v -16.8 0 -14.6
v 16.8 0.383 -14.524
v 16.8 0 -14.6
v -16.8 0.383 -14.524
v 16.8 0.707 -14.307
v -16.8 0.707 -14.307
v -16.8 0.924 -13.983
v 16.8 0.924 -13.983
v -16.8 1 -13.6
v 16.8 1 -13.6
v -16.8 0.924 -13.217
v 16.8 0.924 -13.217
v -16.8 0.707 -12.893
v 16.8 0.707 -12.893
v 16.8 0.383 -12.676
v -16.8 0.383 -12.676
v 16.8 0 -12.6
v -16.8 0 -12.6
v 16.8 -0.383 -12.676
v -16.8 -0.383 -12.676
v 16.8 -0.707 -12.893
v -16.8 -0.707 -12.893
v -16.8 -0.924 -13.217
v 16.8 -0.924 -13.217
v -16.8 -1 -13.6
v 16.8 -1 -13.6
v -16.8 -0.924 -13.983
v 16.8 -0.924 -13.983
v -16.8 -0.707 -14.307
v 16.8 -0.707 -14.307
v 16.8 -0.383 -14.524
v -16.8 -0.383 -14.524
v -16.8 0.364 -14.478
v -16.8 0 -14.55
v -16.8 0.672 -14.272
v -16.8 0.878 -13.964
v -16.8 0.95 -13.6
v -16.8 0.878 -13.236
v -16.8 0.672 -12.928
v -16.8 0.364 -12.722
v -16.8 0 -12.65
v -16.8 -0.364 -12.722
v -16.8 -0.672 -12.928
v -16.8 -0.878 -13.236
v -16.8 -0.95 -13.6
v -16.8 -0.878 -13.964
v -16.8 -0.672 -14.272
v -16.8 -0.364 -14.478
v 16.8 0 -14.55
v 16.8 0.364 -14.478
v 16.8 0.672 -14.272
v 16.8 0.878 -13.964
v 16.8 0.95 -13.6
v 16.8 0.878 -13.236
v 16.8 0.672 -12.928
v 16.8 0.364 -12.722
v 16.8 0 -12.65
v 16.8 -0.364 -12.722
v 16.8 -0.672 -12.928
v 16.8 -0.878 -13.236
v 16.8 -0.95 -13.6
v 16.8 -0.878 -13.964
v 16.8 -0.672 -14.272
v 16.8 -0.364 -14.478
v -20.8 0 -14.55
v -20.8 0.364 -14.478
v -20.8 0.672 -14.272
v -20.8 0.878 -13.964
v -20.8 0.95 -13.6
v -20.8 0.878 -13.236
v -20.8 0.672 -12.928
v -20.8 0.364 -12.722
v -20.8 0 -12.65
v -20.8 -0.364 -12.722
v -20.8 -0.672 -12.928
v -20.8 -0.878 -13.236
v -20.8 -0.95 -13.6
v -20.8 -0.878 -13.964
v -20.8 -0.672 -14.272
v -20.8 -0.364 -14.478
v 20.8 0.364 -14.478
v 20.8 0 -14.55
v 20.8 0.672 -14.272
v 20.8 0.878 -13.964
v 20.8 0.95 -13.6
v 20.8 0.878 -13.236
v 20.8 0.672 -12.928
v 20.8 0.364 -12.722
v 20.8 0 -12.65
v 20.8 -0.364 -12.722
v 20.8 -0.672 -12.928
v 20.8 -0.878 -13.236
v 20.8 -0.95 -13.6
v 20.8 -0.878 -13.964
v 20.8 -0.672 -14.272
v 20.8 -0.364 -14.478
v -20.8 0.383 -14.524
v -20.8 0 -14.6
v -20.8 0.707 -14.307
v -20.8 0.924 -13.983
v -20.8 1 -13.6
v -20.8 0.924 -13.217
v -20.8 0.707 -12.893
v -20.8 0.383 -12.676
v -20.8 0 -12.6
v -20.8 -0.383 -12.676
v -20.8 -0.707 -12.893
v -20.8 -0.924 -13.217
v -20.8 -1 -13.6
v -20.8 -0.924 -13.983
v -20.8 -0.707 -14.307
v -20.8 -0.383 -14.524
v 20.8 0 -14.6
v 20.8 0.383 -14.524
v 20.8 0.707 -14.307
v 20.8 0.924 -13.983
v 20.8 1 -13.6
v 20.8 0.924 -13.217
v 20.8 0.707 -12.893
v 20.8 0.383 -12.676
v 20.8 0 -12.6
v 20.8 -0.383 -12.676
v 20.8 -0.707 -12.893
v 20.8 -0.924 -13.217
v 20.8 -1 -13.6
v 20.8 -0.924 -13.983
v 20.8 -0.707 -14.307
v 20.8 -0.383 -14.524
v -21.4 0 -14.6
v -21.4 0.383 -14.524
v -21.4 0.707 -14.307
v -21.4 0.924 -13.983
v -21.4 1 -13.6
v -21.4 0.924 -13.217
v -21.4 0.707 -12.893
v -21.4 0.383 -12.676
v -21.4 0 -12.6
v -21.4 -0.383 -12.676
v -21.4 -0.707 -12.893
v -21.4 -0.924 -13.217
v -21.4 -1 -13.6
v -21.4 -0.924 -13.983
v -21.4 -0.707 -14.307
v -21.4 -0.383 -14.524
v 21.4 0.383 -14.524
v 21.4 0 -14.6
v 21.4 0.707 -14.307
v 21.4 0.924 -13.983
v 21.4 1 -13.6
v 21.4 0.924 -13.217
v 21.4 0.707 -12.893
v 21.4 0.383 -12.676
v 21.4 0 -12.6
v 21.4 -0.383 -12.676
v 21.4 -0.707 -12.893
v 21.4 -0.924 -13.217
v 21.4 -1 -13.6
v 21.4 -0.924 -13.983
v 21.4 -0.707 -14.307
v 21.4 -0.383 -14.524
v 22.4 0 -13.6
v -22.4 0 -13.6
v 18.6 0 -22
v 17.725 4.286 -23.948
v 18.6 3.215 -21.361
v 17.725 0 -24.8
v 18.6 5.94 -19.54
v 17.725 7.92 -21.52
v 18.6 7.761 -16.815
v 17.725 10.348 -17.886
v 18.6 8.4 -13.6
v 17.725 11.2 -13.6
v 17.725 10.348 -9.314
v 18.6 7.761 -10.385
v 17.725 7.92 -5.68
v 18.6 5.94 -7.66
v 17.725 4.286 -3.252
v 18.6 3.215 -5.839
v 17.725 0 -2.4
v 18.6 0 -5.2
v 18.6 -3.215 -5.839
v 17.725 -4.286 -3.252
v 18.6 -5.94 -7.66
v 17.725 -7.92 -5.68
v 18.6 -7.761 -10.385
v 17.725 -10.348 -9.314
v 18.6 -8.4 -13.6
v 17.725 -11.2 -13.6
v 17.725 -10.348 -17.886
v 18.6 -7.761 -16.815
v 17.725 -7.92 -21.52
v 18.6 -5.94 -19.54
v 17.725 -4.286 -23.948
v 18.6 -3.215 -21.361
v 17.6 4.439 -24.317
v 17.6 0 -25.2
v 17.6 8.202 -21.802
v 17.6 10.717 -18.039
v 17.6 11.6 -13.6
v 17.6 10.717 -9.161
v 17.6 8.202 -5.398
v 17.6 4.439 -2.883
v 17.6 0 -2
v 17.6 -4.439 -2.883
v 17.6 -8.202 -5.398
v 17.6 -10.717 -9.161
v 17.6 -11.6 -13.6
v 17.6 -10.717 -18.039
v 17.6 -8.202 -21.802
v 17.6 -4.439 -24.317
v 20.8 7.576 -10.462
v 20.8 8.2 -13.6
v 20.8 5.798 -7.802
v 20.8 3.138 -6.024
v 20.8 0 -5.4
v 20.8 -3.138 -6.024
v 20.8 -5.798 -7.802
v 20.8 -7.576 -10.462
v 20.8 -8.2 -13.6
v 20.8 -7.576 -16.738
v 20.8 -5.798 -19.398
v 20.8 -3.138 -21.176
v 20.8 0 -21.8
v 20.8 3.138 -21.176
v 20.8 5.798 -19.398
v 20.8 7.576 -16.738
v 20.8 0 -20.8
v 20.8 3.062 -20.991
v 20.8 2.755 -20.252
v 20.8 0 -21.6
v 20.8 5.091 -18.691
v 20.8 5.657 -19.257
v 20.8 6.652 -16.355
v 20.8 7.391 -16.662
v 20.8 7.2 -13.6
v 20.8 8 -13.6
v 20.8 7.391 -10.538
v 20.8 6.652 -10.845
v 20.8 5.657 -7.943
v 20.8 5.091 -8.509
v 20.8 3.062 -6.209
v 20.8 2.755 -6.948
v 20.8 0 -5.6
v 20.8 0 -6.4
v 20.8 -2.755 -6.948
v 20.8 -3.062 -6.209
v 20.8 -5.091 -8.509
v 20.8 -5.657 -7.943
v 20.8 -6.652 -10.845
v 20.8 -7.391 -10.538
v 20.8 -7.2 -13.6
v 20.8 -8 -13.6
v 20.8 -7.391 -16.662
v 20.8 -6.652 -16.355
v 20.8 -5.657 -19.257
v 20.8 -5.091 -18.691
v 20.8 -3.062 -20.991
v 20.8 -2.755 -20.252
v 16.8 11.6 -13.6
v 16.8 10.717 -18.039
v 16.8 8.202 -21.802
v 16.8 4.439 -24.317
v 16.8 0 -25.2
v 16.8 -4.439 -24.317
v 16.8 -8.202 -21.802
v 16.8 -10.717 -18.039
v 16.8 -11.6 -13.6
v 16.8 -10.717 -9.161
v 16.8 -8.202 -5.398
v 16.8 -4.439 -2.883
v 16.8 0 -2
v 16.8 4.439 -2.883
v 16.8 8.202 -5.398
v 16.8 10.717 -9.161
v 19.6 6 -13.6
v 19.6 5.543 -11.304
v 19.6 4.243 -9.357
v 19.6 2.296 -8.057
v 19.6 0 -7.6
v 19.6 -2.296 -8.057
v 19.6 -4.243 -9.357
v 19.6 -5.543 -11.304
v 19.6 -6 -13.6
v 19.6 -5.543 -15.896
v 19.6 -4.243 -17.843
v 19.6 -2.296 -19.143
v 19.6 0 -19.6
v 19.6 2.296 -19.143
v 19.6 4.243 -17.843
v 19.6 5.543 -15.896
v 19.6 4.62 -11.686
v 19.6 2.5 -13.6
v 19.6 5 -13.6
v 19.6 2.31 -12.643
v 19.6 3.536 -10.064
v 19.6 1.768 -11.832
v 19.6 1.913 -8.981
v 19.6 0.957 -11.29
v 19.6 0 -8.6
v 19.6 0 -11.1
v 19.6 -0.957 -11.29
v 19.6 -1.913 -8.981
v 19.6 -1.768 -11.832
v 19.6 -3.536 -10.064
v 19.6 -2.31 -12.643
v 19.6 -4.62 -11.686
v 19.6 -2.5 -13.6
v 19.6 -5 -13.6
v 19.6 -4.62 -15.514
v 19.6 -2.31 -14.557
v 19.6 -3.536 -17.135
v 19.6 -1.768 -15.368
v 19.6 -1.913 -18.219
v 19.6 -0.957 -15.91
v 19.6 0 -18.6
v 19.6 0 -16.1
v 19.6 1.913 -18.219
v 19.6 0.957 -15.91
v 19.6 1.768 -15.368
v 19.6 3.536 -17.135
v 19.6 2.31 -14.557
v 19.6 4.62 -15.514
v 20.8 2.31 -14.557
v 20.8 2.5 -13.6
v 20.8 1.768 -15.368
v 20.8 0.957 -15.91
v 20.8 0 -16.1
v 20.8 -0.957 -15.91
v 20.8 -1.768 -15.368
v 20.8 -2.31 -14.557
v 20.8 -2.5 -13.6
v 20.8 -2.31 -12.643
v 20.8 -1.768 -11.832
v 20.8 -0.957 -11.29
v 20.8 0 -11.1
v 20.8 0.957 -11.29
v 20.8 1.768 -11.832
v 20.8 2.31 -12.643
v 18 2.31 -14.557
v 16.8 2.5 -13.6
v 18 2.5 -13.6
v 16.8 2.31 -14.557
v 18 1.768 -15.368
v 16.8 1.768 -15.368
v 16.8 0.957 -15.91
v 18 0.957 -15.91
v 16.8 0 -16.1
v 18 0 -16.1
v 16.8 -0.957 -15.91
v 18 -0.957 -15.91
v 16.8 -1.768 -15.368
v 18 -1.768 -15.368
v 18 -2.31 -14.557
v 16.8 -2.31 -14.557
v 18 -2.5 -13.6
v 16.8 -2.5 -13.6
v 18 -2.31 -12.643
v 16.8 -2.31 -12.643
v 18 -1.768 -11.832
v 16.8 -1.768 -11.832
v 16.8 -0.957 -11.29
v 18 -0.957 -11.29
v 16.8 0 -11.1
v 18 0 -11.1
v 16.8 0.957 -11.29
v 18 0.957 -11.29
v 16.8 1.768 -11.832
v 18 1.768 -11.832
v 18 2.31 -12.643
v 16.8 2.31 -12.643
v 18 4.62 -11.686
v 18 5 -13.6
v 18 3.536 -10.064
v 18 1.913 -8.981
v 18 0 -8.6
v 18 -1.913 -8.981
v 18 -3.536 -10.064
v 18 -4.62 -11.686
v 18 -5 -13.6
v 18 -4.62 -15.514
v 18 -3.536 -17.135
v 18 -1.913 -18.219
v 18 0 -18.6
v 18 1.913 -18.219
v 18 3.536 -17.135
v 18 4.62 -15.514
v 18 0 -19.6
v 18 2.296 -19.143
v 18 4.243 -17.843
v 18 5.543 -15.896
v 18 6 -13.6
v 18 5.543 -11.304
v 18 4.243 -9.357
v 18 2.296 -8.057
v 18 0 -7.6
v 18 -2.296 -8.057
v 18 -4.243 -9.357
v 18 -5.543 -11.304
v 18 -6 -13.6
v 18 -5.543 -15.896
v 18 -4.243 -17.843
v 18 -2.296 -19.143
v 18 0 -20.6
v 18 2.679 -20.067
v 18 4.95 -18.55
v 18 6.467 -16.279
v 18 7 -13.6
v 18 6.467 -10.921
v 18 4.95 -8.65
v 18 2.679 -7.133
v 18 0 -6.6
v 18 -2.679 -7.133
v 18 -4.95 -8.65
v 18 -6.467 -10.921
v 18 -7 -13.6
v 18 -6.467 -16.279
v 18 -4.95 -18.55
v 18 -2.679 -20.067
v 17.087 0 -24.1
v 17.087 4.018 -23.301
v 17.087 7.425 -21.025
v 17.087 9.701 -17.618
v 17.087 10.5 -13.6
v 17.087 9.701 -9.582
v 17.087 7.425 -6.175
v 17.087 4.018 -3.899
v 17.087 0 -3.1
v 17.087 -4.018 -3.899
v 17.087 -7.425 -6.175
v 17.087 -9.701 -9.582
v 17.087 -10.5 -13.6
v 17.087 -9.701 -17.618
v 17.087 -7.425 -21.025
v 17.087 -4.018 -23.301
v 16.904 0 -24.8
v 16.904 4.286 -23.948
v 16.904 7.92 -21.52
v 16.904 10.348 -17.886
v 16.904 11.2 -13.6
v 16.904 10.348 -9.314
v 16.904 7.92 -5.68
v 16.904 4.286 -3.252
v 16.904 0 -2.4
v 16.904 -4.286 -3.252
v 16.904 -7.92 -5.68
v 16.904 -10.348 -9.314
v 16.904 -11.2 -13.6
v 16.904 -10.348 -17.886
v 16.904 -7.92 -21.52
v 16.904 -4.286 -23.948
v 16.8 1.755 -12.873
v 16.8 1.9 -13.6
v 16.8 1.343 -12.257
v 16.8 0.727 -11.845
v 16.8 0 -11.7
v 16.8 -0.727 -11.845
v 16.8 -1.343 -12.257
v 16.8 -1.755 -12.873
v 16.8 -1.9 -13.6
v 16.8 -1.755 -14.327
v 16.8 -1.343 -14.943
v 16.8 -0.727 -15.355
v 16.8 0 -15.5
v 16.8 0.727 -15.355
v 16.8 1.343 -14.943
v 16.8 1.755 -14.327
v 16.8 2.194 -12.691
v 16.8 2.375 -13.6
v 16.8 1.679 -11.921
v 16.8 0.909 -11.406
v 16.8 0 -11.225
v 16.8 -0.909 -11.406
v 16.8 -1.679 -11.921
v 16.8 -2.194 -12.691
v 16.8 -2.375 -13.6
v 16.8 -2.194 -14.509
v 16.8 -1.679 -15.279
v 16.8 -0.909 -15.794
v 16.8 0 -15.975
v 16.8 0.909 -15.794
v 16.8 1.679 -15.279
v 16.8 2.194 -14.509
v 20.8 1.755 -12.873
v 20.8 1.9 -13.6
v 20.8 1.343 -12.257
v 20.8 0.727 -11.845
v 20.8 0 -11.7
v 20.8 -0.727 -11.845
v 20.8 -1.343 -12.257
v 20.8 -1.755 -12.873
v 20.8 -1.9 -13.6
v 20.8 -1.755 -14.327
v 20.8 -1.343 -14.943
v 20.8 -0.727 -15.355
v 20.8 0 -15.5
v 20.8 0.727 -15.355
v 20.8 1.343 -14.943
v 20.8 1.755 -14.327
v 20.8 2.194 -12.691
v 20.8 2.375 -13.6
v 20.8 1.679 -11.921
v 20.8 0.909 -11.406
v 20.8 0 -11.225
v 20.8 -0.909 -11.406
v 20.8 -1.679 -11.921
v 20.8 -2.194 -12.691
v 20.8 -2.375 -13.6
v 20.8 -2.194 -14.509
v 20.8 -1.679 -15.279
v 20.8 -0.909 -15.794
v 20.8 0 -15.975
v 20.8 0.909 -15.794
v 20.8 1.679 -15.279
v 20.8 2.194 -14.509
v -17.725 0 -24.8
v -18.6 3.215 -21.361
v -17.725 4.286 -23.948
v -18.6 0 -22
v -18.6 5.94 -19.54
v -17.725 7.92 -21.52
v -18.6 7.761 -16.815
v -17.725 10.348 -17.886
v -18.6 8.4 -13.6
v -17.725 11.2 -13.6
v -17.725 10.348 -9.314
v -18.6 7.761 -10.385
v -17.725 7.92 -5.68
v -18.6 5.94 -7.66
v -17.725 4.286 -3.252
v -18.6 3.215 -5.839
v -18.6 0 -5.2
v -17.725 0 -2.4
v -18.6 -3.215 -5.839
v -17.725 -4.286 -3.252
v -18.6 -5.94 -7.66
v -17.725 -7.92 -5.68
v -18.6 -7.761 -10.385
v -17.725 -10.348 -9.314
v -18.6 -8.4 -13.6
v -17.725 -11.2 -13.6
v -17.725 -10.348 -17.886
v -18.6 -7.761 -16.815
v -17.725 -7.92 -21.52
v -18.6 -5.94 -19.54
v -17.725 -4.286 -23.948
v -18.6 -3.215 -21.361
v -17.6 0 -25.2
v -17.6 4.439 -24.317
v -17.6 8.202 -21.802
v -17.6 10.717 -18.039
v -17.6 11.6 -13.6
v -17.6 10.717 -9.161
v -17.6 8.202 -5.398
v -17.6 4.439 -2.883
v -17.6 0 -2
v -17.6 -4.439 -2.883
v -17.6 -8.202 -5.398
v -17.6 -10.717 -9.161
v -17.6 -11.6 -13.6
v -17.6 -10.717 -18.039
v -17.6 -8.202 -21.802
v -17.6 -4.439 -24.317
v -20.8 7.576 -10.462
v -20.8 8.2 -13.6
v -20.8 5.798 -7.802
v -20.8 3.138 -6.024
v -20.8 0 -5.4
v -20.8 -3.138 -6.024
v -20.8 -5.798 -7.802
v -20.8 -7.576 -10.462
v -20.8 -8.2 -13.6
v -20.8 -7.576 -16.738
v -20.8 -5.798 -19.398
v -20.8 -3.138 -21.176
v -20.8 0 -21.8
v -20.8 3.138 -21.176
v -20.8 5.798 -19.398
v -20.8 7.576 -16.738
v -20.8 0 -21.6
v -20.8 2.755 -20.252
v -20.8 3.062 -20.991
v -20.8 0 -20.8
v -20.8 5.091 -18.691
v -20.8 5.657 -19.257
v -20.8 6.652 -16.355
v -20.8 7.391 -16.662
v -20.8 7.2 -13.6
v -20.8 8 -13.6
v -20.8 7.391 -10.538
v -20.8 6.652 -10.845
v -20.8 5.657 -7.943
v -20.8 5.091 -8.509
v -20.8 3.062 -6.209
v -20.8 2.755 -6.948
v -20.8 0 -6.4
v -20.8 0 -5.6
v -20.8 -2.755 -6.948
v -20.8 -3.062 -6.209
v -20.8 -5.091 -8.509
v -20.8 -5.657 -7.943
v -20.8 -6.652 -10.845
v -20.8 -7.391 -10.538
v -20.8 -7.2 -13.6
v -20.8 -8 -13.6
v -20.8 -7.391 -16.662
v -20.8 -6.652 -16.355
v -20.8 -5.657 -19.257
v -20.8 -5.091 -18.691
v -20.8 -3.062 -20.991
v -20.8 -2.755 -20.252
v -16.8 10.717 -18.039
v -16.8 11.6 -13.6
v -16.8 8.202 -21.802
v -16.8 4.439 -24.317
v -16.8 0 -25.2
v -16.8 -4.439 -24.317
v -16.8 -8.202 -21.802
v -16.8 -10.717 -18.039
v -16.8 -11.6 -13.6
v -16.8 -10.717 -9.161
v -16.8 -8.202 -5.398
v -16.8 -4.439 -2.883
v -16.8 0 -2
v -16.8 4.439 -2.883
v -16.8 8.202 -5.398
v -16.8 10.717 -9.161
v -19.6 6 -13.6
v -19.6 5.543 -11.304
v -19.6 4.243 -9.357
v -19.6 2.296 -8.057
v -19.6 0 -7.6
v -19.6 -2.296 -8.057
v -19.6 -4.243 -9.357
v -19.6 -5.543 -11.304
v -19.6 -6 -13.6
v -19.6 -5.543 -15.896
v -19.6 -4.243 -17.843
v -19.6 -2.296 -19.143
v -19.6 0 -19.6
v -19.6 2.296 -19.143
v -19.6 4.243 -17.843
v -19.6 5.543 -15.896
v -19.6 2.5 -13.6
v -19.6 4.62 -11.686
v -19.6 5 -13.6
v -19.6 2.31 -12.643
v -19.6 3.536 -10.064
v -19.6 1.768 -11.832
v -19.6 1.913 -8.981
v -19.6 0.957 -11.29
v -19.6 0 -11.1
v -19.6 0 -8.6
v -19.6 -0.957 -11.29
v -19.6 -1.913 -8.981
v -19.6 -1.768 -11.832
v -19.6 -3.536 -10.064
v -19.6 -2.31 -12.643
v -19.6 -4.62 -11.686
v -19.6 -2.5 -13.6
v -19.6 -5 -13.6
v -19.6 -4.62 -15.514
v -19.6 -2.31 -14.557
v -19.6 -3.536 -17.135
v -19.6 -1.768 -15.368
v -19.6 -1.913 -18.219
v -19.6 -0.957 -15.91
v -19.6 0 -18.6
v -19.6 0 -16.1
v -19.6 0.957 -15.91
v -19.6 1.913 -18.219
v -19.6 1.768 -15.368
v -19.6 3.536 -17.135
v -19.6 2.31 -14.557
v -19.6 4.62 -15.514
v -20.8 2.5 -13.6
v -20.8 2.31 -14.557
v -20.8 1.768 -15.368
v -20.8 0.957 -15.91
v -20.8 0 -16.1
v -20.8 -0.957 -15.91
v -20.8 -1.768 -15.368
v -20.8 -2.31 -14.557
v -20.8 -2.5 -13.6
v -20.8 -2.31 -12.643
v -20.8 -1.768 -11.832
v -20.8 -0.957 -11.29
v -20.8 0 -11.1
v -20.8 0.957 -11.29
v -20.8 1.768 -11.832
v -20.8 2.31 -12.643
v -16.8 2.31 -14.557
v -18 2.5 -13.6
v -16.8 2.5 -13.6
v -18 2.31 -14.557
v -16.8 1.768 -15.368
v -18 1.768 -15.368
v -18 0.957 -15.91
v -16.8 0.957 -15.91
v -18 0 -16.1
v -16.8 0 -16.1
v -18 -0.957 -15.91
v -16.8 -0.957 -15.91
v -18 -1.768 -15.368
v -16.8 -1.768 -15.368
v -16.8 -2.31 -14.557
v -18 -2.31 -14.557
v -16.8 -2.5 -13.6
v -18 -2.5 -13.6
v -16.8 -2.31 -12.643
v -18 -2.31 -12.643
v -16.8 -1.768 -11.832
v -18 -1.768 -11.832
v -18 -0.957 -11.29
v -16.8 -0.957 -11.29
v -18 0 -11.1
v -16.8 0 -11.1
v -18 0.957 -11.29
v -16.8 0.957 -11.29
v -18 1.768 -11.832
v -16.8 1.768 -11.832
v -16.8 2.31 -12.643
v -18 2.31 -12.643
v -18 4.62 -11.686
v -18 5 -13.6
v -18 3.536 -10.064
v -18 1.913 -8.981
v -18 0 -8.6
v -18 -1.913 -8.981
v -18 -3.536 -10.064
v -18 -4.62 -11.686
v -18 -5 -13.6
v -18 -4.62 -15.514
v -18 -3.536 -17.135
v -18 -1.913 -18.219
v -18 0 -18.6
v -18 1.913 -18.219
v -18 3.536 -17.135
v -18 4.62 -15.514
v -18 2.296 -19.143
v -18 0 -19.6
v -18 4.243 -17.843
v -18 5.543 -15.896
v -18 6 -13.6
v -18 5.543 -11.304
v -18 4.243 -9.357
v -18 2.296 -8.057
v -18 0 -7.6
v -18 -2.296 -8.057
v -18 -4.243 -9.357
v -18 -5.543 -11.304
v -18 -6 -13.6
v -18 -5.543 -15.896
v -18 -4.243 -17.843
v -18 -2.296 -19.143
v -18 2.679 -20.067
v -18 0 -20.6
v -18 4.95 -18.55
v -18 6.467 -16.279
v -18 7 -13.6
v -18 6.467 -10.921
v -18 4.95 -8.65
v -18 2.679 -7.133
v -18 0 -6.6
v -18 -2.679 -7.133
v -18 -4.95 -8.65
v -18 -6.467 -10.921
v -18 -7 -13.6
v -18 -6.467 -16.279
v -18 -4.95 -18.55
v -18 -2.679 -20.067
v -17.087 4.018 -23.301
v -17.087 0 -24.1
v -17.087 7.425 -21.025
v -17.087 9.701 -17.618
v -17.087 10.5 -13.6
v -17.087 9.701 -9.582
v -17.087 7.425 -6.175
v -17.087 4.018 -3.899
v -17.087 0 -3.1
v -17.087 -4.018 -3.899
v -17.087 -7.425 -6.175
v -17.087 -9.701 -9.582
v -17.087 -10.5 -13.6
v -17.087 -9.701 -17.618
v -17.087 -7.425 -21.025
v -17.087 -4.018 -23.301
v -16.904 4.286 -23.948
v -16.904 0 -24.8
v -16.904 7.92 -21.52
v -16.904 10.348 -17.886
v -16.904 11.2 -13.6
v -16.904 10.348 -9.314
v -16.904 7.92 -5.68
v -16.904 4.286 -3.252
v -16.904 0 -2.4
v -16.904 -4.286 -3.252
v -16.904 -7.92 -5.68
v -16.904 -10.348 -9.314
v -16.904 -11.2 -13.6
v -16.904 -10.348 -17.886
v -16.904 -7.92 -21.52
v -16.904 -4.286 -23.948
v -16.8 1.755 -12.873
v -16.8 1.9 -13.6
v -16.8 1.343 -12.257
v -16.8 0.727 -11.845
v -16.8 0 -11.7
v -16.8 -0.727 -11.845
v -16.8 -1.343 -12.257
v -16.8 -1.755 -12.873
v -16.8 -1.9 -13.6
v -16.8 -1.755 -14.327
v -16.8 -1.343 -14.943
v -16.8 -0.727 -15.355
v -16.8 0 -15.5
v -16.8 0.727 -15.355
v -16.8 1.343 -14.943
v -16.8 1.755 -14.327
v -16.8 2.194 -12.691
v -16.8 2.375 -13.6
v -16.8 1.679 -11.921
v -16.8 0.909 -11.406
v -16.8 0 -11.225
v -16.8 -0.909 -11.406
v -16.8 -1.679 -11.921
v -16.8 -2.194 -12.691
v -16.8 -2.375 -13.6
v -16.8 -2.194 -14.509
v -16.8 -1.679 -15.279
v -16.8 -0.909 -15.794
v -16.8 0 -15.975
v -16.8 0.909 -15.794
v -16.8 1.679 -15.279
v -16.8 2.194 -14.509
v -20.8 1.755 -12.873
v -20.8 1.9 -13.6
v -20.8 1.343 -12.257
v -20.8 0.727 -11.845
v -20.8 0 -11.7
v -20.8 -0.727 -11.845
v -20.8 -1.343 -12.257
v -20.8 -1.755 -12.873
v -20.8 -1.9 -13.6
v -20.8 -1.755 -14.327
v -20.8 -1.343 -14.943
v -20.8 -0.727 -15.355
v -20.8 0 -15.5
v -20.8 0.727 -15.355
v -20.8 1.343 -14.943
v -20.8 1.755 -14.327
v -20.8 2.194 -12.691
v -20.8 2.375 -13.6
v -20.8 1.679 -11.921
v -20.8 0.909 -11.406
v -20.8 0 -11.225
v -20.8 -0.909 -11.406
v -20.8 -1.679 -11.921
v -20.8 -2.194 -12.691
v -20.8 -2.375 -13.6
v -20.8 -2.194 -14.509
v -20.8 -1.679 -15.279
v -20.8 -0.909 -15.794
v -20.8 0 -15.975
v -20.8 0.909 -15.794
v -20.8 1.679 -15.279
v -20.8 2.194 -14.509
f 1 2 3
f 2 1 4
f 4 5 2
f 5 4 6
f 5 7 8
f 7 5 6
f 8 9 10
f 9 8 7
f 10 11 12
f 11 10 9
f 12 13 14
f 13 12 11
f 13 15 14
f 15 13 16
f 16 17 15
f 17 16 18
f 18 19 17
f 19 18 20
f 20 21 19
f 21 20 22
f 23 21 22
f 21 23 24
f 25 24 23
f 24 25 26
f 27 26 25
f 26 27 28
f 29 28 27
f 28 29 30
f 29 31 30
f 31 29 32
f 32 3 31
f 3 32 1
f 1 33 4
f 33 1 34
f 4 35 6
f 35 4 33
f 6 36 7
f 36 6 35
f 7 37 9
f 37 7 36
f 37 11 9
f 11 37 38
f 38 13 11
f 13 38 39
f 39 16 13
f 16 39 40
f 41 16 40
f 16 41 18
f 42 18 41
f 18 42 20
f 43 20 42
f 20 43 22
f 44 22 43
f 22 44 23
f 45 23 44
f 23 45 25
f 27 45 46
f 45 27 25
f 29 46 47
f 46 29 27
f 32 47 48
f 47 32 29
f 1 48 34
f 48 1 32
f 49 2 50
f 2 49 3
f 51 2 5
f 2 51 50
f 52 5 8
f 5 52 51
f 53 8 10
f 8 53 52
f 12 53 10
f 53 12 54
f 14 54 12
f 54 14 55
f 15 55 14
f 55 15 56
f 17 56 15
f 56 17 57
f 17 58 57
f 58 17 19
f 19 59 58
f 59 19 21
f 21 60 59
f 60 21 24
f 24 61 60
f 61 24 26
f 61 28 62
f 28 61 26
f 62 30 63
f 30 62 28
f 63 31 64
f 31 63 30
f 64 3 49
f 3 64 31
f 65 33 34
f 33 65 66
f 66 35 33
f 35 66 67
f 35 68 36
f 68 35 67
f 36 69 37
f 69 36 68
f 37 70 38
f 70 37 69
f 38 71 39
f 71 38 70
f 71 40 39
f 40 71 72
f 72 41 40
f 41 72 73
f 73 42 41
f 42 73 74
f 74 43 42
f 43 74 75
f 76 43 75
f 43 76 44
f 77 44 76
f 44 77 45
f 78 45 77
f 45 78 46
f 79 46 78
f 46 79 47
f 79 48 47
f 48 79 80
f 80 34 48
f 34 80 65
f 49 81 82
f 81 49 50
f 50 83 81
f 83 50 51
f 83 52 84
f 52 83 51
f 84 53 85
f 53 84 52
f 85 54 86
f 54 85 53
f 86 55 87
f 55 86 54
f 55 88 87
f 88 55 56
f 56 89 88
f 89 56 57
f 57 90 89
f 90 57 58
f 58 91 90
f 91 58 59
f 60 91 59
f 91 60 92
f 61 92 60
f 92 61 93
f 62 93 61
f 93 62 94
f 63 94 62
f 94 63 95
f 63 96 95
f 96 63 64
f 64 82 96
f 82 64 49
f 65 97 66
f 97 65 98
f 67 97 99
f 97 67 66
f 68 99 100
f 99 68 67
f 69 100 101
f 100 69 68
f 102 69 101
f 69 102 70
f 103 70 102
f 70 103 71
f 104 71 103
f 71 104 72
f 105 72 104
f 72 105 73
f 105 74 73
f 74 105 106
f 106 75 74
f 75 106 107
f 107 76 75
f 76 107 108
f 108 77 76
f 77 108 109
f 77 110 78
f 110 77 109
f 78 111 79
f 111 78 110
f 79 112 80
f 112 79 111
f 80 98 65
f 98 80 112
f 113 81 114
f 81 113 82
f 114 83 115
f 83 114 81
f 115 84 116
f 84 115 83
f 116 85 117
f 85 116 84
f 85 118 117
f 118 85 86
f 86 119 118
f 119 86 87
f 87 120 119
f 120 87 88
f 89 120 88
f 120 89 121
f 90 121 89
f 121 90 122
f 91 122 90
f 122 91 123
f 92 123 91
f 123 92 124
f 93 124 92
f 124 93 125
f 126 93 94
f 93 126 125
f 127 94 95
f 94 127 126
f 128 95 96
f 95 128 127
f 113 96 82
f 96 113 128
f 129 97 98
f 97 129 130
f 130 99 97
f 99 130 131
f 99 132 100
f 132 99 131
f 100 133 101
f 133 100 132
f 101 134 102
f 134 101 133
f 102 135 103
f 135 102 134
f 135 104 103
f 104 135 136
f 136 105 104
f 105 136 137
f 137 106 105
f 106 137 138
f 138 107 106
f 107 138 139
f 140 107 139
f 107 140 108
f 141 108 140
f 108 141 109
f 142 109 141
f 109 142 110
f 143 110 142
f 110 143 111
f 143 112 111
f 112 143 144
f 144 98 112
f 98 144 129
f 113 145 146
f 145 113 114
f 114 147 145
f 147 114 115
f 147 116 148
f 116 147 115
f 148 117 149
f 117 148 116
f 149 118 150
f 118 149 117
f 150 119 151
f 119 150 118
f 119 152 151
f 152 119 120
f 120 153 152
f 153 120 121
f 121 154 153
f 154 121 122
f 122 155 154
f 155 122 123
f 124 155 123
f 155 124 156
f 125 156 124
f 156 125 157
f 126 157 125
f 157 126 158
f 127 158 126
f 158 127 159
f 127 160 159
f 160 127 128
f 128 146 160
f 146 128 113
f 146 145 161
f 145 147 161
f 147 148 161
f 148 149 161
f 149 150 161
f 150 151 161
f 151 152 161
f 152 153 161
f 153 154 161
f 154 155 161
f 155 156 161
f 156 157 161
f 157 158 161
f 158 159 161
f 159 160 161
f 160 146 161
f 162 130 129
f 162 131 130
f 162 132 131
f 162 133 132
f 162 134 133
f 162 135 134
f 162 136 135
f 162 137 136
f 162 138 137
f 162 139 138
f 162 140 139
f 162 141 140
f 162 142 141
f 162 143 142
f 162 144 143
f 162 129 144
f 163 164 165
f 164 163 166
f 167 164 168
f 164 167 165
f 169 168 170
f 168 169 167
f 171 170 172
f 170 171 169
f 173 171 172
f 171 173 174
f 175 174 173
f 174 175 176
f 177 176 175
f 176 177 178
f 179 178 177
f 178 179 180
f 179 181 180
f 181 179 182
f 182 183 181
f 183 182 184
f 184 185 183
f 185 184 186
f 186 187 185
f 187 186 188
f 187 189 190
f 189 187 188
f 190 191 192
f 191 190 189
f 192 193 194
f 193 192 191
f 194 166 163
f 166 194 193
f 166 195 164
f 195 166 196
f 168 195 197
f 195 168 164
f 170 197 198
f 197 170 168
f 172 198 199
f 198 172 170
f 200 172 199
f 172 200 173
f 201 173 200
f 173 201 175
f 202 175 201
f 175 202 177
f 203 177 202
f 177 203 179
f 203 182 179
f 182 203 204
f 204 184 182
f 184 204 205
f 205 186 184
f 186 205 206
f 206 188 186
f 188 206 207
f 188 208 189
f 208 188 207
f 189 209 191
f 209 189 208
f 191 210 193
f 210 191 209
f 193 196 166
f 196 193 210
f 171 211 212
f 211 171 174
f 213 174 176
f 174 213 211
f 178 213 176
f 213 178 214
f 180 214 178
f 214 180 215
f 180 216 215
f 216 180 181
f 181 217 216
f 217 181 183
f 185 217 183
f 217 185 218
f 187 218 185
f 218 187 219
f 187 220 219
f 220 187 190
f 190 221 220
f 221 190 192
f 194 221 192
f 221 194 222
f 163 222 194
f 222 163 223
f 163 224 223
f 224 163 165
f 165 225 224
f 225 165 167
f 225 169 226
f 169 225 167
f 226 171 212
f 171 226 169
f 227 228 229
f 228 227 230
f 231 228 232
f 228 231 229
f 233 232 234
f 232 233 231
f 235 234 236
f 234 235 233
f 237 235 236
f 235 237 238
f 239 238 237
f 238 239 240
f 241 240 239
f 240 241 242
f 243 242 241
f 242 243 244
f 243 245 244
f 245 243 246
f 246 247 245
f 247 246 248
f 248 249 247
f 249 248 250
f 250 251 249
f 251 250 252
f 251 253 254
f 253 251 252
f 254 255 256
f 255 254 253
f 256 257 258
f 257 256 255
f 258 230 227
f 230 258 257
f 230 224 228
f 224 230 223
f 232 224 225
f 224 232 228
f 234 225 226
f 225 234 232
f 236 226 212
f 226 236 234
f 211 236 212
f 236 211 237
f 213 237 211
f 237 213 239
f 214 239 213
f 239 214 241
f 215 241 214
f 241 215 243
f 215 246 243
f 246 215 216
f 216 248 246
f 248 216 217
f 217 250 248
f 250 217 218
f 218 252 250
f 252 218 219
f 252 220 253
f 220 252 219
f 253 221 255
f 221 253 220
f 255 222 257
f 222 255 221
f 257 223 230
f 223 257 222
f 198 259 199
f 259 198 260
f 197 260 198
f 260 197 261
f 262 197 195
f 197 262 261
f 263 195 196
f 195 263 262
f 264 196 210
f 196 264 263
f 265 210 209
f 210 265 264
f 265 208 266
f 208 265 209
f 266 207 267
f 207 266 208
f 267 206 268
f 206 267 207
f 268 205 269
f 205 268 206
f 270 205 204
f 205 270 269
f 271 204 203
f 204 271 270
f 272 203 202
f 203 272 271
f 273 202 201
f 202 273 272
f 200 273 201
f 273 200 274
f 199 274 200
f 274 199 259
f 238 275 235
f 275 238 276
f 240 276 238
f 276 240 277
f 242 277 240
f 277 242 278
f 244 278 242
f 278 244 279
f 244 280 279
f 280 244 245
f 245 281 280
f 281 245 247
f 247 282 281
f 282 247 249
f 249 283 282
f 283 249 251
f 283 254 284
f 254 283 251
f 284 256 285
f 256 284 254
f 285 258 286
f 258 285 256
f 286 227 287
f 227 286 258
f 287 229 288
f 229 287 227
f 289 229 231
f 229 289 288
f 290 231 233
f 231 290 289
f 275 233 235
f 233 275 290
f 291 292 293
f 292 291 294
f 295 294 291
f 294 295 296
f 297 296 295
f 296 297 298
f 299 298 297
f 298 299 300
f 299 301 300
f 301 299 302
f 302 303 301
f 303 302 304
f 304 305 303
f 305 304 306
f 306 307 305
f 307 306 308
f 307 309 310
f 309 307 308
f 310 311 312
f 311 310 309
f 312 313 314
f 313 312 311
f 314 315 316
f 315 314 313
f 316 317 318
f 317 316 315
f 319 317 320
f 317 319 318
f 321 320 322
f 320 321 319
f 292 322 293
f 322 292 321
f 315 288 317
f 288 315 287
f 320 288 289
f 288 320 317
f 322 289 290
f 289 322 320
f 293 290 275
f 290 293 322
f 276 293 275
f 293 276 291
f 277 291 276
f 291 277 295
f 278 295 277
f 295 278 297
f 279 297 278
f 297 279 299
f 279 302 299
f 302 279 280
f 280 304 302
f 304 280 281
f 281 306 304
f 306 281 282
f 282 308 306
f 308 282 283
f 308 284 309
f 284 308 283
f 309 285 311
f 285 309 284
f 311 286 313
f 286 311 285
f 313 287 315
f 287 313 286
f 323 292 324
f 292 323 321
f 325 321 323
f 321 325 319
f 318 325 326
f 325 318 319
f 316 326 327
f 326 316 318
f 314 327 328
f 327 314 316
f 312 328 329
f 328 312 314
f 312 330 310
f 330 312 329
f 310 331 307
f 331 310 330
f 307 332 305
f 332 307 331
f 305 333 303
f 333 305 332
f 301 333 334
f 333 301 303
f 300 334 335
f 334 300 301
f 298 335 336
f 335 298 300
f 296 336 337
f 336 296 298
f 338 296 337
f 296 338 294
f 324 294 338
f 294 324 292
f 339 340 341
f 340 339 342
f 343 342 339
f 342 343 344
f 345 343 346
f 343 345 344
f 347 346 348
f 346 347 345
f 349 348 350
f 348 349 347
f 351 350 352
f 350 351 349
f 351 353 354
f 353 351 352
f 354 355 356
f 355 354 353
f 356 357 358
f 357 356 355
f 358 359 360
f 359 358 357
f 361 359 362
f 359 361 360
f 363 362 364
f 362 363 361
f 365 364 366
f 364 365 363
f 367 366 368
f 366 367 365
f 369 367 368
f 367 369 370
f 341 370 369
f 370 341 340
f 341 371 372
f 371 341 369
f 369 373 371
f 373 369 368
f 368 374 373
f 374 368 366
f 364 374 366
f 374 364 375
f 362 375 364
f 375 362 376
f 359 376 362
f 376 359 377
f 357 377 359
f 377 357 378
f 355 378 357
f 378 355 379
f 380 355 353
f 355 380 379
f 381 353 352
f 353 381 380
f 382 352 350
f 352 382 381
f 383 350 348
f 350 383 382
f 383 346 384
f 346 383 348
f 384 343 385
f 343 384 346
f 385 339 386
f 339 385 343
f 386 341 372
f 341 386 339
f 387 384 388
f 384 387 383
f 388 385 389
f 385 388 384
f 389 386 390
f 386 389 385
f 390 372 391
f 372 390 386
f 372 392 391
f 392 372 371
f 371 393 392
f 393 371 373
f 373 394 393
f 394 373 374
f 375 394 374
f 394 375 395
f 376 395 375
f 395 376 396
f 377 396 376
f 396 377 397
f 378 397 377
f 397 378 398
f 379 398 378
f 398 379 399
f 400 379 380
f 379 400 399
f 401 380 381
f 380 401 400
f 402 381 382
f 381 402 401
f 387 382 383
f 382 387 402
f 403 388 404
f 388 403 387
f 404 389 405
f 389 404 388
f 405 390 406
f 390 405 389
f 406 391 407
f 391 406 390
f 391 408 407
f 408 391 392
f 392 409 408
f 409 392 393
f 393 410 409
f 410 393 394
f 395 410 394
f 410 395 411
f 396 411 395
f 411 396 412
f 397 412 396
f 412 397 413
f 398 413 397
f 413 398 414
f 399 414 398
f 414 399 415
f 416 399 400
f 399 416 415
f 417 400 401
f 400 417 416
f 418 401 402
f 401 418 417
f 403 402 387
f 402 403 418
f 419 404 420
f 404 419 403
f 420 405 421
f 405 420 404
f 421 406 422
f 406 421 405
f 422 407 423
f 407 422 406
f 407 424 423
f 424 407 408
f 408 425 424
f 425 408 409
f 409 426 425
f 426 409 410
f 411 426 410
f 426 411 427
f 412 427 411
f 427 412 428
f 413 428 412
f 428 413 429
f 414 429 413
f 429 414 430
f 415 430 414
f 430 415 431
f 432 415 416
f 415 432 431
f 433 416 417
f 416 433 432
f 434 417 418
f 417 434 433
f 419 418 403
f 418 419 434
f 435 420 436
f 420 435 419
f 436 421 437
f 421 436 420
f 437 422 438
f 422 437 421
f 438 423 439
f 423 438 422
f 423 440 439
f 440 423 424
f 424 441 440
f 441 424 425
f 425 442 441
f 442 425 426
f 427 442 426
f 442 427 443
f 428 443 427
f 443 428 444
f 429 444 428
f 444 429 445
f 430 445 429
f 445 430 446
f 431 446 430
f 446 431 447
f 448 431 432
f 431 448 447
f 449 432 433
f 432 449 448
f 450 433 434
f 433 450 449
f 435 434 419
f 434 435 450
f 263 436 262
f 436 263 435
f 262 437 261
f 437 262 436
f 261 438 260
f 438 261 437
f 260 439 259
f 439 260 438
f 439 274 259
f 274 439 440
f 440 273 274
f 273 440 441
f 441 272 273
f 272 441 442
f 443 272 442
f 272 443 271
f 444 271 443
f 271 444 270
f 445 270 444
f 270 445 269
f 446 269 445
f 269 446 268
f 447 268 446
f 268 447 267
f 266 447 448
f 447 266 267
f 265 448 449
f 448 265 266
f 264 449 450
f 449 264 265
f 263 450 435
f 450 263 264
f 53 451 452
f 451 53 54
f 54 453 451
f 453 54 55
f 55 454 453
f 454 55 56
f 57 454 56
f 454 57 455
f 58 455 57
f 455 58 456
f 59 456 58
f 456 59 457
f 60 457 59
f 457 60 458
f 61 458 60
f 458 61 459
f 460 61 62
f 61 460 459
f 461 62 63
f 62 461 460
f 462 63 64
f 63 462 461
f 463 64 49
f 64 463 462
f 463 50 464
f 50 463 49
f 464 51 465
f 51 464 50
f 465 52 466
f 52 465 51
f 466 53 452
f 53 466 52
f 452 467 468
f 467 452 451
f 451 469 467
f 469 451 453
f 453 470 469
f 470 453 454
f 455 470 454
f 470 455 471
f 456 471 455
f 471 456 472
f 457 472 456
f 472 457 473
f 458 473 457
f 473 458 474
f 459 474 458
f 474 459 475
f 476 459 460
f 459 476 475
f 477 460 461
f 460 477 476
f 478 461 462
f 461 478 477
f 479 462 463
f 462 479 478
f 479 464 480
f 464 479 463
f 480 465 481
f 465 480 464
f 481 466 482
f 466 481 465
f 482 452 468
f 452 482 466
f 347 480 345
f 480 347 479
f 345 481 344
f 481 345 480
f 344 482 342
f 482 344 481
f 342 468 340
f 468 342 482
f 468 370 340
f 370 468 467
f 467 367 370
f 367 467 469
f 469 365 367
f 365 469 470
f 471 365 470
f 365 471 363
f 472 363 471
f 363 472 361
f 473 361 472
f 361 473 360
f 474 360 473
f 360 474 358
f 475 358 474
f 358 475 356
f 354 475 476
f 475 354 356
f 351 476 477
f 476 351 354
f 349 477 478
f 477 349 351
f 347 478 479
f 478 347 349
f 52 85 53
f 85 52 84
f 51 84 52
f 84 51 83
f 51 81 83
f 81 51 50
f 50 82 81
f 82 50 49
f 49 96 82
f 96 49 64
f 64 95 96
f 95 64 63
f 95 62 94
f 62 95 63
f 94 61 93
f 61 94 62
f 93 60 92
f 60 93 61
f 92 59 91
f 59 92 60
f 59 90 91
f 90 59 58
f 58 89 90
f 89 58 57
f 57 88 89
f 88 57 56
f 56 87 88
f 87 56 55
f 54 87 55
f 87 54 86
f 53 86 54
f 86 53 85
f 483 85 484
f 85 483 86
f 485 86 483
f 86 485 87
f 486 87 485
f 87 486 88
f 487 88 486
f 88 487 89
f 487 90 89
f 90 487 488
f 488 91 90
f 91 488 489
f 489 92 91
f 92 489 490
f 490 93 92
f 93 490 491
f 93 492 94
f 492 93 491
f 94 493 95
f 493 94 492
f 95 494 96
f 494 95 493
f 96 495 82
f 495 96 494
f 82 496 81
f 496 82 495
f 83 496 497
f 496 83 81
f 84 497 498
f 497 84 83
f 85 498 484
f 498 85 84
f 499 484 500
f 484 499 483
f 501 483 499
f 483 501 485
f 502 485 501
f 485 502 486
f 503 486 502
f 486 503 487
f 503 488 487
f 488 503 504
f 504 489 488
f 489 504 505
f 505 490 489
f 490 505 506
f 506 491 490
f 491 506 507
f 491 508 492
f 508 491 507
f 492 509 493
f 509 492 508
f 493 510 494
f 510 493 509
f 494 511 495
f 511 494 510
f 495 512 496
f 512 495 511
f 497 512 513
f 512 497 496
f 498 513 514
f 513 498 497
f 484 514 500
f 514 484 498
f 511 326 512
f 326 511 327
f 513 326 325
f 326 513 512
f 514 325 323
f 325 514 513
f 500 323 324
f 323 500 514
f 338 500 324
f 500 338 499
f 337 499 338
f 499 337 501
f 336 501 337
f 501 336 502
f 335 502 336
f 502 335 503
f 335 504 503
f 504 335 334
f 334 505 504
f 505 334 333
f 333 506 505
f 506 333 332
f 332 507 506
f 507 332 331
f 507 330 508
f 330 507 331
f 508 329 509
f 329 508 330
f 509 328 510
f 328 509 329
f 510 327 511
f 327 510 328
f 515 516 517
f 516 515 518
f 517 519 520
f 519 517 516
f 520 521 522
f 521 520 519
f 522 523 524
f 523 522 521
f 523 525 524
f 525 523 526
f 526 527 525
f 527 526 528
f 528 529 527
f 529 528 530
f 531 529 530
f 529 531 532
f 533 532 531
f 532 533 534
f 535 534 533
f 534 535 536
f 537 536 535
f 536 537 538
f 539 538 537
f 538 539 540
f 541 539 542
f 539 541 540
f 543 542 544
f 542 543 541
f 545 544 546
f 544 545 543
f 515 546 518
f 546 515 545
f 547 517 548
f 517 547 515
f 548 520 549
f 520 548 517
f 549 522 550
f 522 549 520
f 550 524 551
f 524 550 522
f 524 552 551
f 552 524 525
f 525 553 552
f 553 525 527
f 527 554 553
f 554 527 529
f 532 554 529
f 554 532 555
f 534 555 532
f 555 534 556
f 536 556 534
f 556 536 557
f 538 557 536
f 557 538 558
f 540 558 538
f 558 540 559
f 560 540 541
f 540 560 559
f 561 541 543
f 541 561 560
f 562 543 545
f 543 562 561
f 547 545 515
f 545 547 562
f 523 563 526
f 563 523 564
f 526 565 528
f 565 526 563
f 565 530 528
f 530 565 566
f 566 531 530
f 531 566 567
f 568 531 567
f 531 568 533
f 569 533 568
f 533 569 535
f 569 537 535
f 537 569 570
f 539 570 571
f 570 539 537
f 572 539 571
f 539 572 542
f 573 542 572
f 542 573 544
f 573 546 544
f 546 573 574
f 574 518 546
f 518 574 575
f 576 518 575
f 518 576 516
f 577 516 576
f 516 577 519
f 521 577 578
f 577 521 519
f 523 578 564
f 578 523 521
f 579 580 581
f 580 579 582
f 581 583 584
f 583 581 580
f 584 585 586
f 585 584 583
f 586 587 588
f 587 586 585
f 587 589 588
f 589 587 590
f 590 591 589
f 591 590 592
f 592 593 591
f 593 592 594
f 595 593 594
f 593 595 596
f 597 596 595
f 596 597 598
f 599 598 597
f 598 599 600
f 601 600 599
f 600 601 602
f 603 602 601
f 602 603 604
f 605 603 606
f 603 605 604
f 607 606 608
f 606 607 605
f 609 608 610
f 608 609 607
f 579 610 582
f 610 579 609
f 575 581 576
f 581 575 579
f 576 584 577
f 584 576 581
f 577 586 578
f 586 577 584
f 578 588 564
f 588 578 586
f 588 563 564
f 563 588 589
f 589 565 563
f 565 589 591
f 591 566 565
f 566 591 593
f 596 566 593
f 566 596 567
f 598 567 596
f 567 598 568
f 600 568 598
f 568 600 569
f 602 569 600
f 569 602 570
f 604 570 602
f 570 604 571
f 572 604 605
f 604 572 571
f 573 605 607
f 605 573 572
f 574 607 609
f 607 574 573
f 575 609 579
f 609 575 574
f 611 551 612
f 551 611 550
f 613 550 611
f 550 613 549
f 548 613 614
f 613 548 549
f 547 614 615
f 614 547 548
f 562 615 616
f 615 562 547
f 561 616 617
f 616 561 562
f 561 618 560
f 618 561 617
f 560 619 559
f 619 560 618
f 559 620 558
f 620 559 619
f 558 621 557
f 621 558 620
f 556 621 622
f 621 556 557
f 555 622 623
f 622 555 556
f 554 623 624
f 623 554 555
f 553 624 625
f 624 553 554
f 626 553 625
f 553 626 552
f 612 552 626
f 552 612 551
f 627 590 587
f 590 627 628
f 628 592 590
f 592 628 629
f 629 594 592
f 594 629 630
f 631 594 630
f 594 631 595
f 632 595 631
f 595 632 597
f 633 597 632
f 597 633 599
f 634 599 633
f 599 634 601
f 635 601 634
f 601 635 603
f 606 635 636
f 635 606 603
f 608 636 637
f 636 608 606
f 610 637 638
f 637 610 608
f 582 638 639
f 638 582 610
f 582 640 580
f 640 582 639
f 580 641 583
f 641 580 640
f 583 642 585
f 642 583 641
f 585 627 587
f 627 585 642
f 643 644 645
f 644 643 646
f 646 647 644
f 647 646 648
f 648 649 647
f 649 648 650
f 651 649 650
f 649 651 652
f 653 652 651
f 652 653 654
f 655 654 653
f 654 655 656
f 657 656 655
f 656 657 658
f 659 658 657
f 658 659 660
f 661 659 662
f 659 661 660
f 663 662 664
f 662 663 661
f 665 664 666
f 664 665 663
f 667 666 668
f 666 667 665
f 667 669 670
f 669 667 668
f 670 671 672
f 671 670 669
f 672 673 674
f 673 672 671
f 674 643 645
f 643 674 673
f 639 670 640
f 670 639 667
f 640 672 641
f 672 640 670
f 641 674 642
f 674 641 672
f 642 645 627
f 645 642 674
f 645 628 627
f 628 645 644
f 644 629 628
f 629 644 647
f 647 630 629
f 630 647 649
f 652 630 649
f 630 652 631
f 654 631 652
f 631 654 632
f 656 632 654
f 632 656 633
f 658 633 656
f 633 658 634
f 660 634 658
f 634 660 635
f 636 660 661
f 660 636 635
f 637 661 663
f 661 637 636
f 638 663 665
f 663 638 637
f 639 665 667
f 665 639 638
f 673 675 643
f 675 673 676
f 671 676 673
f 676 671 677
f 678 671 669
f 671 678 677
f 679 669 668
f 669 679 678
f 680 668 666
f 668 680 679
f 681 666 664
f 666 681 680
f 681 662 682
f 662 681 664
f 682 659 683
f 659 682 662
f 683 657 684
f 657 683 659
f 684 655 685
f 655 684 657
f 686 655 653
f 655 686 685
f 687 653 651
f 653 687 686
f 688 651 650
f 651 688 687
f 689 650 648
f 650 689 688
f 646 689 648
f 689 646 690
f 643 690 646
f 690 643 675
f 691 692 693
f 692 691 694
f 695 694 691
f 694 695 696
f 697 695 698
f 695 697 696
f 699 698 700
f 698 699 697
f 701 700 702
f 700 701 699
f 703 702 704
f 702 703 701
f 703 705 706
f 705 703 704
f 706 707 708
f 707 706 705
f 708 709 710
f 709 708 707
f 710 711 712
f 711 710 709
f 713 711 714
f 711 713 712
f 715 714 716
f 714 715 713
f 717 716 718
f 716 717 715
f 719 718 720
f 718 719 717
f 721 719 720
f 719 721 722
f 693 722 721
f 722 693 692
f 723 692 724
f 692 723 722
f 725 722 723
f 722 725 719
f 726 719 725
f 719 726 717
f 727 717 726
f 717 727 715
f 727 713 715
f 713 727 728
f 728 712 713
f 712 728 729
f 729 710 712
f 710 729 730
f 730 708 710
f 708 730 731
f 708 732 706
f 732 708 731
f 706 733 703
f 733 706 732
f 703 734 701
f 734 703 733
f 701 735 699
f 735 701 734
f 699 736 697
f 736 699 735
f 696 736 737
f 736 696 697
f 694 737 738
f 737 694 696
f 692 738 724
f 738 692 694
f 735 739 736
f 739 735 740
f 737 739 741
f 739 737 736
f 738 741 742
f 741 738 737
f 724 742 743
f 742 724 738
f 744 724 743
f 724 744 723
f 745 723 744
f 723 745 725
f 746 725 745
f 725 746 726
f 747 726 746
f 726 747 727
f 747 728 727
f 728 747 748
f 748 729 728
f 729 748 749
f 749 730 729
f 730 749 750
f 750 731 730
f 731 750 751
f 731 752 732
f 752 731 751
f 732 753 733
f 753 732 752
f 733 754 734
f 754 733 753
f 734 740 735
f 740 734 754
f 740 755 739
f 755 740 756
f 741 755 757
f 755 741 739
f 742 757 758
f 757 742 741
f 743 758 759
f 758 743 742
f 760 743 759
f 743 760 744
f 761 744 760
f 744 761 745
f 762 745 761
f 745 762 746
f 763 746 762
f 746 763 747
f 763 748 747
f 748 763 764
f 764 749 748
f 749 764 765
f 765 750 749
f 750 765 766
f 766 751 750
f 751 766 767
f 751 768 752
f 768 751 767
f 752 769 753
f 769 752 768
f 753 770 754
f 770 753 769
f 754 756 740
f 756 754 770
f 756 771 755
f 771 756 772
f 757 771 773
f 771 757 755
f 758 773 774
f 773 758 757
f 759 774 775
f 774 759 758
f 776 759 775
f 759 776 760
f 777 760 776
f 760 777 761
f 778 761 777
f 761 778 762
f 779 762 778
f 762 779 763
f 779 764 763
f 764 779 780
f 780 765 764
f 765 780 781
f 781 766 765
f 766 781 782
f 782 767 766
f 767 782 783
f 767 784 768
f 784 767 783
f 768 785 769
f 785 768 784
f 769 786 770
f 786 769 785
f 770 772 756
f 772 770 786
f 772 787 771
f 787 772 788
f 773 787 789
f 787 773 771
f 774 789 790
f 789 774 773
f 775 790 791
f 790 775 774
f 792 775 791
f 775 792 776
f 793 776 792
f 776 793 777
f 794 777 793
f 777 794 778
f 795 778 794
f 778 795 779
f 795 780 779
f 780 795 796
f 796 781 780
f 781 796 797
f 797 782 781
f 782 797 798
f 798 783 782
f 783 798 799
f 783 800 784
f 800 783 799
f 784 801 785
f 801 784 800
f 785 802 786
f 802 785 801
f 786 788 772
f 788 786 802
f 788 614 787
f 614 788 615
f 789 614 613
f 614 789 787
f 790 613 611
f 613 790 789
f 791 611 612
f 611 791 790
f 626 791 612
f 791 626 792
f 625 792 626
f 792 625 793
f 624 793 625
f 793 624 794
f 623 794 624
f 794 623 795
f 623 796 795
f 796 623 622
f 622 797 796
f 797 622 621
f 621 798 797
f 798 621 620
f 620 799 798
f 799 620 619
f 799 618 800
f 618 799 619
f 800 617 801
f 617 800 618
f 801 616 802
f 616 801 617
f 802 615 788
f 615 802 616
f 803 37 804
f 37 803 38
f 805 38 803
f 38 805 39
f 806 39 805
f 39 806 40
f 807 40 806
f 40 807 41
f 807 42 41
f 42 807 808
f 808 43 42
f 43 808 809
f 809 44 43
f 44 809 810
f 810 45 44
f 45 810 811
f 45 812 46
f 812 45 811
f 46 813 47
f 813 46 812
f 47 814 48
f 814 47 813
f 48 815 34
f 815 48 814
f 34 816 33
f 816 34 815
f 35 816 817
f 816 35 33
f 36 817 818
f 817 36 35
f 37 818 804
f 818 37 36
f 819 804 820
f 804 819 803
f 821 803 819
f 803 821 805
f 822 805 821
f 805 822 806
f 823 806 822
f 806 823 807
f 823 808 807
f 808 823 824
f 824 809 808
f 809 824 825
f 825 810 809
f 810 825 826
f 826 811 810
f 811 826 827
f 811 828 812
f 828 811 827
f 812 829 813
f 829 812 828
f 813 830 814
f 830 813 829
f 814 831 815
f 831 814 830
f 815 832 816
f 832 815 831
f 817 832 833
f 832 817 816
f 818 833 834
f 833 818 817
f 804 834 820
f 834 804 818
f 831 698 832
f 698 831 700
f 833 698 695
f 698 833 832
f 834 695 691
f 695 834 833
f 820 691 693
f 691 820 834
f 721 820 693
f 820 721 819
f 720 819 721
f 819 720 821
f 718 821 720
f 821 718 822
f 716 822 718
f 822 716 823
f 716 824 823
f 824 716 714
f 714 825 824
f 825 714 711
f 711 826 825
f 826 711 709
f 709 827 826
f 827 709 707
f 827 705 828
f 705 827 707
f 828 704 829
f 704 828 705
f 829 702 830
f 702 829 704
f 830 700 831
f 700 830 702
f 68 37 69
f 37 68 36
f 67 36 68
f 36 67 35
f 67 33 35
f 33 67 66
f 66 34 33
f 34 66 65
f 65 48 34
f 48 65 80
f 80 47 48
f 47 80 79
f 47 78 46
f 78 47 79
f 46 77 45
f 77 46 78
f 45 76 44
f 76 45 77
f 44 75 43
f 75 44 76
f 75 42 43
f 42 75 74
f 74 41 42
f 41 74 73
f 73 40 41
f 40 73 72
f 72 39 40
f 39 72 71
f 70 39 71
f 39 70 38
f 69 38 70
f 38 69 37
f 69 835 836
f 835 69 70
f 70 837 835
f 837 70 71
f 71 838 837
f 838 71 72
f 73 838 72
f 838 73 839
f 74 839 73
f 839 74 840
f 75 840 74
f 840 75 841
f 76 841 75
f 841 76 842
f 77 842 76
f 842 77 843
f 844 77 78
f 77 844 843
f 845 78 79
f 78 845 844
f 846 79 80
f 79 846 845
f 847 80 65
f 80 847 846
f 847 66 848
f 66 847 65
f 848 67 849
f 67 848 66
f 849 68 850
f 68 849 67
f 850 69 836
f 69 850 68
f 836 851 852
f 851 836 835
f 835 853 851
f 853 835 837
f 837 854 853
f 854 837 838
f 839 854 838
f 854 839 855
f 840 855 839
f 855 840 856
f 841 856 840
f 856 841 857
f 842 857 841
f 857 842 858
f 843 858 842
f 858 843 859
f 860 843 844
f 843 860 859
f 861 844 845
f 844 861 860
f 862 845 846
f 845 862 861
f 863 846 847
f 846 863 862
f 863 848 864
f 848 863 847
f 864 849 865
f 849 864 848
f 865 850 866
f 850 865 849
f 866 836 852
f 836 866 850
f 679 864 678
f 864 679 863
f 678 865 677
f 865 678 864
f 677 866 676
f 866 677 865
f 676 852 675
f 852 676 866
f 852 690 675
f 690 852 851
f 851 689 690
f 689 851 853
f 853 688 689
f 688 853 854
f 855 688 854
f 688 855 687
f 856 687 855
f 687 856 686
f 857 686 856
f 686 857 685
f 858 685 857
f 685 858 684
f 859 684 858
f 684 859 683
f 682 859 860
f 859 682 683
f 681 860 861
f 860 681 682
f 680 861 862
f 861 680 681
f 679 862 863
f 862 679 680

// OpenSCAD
use <../lib.scad>
use <70720c01.scad>
function ldraw_lib__2879c01() = [
// 0 ~Moved to 70720c01
// 0 Name: 2879c01.dat
// 0 Author: [PTadmin]
// 0 !LDRAW_ORG Shortcut UPDATE 2013-02
// 0 !LICENSE Licensed under CC BY 2.0 and CC BY 4.0 : see CAreadme.txt
// 
// 0 BFC CERTIFY CCW
  [0,"BFC","CERTIFY"],
  [0,"BFC","CCW"],
// 
// 0 !HISTORY 2003-12-19 [PTadmin] Official Update 2003-03
// 0 !HISTORY 2007-05-20 [PTadmin] Header formatted for Contributor Agreement
// 0 !HISTORY 2008-07-01 [PTadmin] Official Update 2008-01
// 0 !HISTORY 2013-03-02 [MagFors] Changed colour 383 to 494 (real metal)
// 0 !HISTORY 2013-03-07 [MagFors] Moved to 70720c01
// 0 !HISTORY 2013-12-23 [PTadmin] Official Update 2013-02
// 
// 
// 0 // old description: Train Wheel 9V Pair on Axle (Shortcut)
// 0 // new description: ~Axle Steel 6 x 110 with Two Train Wheels 9V
// 
// 1 16 0 34 0 1 0 0 0 1 0 0 0 1 70720c01.dat
  [1,16,0,34,0,1,0,0,0,1,0,0,0,1, ldraw_lib__70720c01()],
];
module ldraw_lib__2879c01(step=0, col=false, unit=2/5, alt=false, line=0.2, solid=!$preview)
    makepoly(ldraw_lib__2879c01(), step=step, col=col, unit=unit, alt=alt, line=line, solid=solid);
ldraw_lib__2879c01(line=0.2);
